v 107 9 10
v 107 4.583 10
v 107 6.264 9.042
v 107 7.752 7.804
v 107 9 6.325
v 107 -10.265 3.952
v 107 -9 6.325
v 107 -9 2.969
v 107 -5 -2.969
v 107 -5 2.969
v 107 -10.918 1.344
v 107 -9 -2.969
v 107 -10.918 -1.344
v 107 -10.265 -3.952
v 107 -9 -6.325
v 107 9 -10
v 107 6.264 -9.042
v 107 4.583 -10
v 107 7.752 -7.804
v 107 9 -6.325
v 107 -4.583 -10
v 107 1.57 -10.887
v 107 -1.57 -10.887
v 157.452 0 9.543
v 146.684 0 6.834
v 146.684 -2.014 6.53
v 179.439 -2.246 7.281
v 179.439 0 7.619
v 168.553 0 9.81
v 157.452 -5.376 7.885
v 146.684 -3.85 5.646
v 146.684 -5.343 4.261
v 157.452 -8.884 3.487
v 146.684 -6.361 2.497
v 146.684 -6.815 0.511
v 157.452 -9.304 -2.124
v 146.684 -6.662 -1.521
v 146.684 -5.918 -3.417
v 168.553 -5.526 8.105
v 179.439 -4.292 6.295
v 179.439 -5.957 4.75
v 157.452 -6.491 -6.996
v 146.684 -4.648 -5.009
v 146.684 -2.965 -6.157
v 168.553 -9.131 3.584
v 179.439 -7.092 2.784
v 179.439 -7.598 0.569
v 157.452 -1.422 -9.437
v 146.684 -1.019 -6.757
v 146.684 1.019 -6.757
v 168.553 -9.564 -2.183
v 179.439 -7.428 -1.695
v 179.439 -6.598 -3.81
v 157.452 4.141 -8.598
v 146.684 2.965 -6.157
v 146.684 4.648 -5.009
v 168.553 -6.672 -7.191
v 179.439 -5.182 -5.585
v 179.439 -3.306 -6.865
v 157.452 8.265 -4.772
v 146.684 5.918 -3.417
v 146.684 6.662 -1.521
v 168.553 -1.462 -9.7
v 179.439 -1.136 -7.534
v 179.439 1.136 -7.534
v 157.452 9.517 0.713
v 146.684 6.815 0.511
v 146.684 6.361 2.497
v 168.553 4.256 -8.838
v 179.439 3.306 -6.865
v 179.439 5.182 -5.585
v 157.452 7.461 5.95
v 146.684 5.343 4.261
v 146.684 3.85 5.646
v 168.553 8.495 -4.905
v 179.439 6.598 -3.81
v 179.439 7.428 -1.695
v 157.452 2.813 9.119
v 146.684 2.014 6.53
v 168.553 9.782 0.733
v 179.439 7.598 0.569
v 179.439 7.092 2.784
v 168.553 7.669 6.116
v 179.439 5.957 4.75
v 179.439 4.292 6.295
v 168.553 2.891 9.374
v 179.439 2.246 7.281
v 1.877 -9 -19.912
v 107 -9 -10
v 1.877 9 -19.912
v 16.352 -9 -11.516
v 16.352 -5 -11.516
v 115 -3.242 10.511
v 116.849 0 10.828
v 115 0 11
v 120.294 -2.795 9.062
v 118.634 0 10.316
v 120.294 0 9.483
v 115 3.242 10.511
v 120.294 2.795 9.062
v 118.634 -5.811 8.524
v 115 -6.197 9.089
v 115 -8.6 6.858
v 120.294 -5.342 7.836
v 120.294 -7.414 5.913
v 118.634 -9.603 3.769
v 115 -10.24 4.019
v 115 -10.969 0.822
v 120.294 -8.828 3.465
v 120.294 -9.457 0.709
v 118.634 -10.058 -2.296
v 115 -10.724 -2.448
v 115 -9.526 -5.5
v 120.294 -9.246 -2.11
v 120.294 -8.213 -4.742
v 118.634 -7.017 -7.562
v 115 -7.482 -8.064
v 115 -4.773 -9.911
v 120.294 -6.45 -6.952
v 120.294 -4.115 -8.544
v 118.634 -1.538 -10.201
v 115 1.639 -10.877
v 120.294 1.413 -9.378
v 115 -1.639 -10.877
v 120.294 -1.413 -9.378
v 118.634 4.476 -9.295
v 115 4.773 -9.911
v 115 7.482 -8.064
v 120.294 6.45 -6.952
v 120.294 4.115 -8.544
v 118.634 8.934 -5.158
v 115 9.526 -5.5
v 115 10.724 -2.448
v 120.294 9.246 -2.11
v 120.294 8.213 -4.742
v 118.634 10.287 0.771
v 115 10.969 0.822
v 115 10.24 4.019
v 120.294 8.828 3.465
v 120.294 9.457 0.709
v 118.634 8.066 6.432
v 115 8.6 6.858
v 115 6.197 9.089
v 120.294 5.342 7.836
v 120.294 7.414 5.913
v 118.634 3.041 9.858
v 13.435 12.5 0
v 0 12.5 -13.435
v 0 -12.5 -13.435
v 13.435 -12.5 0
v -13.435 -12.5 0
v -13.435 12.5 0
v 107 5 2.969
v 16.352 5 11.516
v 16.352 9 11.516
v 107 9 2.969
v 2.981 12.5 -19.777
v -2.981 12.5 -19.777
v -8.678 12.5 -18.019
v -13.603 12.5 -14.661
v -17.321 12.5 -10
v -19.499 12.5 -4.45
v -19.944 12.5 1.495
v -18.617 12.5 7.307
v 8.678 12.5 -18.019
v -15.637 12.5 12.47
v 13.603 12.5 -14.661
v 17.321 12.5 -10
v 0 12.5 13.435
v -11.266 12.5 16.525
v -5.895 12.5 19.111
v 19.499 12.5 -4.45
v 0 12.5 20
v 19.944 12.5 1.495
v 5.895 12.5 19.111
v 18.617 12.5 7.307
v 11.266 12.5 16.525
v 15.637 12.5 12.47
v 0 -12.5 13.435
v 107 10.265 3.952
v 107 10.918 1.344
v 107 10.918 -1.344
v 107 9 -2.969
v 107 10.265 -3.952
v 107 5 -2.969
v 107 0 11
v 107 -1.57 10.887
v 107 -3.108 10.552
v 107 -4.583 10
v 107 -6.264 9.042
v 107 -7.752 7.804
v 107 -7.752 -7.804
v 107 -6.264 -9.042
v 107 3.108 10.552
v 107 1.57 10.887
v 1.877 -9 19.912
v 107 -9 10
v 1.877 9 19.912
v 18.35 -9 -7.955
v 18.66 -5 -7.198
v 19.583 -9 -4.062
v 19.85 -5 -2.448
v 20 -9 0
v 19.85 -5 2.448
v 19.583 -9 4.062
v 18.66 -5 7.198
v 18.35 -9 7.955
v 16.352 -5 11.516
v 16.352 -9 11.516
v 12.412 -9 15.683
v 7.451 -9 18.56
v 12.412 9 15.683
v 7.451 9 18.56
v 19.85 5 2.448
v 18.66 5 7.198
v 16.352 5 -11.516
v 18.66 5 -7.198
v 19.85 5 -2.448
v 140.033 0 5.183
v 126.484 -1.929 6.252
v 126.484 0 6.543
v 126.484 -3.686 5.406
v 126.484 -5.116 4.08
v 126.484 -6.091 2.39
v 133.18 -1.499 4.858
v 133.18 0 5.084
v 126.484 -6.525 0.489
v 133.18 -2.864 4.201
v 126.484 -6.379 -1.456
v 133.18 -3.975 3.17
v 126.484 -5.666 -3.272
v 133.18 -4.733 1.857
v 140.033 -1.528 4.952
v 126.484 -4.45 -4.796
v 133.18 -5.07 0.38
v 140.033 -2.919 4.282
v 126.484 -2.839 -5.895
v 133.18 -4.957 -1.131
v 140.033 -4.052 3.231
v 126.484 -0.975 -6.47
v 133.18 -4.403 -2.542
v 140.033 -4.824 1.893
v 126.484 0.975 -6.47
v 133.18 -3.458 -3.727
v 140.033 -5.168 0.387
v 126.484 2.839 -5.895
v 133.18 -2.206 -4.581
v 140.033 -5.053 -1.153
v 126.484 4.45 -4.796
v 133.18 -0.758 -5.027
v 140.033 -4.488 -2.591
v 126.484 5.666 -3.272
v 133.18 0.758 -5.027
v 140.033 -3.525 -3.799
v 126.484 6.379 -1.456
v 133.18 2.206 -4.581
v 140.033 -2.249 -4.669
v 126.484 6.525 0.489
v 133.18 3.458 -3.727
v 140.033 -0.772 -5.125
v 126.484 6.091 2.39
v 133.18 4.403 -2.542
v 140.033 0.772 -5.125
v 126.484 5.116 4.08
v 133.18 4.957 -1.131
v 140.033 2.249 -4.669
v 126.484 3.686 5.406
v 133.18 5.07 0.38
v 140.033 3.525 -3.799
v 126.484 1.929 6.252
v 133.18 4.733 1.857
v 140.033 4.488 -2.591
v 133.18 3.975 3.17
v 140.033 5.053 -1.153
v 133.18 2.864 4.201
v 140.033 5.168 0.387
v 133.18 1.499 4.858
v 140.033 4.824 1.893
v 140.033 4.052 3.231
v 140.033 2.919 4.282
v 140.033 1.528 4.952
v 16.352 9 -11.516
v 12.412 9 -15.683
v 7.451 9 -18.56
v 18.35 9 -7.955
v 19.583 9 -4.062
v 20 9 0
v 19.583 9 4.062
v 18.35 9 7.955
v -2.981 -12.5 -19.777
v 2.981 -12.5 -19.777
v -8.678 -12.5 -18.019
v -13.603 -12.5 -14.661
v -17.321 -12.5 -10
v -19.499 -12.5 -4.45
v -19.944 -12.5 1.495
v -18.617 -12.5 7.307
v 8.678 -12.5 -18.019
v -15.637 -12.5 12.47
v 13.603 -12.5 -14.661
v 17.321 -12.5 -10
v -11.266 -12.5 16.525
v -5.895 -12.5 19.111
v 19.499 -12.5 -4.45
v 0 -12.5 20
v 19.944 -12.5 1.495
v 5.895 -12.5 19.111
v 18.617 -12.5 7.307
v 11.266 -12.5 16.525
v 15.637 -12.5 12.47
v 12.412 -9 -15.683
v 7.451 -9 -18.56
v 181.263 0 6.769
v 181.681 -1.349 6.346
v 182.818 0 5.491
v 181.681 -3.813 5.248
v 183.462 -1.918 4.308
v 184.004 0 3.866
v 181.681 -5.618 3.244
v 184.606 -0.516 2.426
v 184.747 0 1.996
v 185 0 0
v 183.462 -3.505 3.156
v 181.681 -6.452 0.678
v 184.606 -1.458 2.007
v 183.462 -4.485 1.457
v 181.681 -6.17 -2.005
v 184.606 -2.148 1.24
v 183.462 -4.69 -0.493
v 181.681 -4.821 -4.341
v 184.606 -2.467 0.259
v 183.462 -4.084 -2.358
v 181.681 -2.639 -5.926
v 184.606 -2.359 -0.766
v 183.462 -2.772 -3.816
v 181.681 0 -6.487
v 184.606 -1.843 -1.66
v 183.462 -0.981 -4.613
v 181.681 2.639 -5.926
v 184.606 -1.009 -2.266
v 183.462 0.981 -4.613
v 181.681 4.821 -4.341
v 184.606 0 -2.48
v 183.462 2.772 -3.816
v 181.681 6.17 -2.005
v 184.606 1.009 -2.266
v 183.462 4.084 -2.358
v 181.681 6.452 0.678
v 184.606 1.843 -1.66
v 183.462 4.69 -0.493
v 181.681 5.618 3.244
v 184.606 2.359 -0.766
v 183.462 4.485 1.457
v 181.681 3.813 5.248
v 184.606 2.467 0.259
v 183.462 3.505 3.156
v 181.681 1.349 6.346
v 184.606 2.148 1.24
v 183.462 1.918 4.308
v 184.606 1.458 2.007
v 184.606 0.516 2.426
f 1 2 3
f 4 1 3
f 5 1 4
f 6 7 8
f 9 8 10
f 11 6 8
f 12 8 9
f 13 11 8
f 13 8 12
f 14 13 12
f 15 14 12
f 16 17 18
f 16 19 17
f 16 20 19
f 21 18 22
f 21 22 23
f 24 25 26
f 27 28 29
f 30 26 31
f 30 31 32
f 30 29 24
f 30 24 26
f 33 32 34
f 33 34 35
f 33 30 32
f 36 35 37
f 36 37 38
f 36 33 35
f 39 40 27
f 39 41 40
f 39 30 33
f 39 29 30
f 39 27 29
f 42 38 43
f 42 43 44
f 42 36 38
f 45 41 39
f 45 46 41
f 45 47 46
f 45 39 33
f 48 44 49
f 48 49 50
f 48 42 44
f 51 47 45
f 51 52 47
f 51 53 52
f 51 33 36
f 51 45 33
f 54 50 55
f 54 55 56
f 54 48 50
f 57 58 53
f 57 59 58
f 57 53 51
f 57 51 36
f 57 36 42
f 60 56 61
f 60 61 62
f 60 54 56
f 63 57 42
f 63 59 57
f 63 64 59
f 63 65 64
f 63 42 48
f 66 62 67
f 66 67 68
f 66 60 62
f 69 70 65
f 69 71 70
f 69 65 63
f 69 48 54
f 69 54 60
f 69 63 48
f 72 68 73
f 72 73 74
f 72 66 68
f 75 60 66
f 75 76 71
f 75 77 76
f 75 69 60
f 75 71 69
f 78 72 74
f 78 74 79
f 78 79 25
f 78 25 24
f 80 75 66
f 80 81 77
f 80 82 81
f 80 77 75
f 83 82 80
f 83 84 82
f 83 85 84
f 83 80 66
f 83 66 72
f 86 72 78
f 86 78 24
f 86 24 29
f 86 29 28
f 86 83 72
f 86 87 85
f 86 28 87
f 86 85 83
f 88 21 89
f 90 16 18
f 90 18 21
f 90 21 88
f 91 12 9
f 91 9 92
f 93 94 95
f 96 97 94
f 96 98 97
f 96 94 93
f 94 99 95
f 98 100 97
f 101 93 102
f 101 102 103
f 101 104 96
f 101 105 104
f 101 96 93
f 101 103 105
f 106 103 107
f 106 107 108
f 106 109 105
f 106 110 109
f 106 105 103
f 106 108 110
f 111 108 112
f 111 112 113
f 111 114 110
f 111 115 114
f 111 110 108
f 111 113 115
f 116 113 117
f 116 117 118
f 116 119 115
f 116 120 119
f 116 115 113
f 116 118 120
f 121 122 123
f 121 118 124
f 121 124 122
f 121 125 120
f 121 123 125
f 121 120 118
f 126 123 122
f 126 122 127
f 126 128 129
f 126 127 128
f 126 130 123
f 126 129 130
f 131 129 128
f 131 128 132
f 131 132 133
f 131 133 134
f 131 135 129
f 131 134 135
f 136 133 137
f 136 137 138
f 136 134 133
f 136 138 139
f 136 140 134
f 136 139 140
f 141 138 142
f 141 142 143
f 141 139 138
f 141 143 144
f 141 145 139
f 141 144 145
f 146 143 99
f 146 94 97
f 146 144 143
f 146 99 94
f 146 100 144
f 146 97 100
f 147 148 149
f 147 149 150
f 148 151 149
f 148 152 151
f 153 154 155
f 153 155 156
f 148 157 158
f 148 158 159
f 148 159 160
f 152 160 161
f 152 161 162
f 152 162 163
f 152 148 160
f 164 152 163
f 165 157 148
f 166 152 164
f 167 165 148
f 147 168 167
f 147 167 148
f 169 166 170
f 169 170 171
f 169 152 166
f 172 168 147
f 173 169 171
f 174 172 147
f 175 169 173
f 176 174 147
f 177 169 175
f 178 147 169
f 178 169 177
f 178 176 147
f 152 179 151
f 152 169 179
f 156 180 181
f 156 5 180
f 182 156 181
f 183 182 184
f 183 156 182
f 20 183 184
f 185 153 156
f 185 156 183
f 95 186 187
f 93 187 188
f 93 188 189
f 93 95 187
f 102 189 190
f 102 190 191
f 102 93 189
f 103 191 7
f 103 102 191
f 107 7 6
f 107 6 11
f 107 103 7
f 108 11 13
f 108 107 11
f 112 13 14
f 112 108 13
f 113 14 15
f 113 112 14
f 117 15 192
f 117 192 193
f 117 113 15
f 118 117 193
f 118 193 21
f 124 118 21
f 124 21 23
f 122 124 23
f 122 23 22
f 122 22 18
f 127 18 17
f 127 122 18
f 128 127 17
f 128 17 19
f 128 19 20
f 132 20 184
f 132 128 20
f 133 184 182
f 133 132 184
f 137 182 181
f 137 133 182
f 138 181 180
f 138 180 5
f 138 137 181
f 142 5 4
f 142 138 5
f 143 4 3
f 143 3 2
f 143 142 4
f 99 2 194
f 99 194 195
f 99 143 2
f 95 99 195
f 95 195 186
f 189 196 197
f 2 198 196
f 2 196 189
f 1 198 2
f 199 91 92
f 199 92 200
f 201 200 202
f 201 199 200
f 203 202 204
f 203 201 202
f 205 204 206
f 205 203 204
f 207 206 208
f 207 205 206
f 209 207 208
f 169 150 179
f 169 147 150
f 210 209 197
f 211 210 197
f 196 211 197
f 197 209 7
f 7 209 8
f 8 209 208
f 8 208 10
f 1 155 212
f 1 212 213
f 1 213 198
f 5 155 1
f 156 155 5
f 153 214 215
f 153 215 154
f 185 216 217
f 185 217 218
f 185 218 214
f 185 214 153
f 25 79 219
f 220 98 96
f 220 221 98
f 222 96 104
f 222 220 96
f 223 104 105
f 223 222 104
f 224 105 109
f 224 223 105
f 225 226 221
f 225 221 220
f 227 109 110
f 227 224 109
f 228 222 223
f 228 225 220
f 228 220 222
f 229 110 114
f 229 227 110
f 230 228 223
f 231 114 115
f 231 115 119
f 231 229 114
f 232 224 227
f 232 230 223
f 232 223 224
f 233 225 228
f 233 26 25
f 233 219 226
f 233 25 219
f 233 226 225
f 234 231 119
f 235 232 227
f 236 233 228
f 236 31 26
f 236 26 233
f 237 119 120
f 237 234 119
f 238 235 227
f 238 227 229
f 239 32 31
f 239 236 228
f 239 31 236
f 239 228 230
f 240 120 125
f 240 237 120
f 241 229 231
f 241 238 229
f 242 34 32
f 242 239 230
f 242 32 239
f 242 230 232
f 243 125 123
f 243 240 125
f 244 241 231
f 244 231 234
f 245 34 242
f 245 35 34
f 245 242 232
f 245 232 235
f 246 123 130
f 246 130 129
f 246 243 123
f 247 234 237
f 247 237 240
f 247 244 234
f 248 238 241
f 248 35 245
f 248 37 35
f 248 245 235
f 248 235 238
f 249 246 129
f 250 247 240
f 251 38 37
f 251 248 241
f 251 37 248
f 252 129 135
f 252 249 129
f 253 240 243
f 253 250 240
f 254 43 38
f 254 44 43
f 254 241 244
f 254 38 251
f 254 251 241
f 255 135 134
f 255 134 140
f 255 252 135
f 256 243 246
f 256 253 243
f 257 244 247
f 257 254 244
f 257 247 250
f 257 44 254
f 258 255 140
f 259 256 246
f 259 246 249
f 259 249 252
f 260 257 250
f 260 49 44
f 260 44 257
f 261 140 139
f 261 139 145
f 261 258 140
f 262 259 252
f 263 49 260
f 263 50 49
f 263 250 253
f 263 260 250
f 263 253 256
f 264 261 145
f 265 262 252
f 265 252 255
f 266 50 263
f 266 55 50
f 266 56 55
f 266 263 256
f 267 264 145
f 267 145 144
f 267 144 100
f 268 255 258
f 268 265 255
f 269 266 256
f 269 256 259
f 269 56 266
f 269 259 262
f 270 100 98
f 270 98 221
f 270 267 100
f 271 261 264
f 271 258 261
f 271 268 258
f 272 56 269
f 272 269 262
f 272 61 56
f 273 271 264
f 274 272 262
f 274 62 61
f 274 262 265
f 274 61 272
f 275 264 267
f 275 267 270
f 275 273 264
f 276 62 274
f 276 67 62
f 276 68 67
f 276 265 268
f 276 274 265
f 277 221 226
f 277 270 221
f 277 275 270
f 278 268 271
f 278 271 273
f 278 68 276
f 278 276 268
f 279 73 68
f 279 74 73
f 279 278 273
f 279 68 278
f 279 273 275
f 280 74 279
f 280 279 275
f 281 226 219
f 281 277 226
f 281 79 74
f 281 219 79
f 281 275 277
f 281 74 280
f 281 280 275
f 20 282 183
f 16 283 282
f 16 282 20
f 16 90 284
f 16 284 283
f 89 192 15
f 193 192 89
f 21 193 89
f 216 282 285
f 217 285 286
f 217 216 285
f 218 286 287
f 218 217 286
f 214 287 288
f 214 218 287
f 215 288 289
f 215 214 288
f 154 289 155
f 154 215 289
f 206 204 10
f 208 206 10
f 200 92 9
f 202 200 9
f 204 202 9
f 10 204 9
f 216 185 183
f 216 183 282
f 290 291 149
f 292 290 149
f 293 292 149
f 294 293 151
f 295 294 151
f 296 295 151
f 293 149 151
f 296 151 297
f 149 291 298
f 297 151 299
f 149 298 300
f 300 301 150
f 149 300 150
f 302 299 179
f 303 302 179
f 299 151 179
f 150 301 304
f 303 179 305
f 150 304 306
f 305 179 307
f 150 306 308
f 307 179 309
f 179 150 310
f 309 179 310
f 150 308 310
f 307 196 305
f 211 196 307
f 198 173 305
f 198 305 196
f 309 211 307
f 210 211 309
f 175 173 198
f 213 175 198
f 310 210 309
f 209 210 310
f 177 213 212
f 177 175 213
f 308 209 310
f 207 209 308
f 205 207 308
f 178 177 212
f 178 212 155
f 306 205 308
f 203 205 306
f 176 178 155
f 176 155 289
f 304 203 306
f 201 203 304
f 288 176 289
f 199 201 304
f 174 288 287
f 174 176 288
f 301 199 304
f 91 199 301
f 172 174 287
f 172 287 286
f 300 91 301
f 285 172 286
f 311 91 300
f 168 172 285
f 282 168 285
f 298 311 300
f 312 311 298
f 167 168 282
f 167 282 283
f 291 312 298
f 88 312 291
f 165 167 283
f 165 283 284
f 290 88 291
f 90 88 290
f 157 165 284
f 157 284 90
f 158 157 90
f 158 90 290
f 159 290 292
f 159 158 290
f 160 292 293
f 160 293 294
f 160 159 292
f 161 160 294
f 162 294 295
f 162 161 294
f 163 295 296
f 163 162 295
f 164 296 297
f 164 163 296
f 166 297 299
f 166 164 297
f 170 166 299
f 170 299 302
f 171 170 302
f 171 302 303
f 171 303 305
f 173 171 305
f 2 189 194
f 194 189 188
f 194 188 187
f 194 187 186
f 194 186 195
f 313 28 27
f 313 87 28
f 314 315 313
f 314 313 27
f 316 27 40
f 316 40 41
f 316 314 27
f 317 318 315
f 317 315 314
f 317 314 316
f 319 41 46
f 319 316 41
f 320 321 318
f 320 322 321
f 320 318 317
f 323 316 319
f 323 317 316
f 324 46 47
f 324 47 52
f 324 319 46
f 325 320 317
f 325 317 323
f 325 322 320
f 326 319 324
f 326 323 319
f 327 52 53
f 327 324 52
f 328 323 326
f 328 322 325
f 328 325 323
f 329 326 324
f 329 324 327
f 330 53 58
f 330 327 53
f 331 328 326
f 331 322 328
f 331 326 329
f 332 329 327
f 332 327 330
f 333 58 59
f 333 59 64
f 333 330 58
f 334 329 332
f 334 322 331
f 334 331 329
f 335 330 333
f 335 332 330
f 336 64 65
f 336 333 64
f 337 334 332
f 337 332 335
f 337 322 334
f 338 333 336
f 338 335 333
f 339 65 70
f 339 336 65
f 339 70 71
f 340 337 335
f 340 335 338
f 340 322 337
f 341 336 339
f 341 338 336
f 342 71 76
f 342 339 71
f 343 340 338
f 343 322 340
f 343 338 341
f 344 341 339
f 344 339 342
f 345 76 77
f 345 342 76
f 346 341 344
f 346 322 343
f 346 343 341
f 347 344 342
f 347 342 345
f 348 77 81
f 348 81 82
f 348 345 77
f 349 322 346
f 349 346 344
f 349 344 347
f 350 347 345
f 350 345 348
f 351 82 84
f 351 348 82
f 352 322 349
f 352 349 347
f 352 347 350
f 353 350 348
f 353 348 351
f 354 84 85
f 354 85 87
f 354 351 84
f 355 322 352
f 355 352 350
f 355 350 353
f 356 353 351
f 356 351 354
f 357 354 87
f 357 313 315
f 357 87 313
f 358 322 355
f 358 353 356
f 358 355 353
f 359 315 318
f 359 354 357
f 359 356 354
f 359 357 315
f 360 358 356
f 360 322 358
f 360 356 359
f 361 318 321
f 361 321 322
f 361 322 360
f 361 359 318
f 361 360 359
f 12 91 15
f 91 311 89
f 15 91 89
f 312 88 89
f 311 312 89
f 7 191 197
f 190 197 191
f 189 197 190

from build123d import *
from build123d.topology import SkipClean

# Parameters (mm, degrees)
SKETCH_1_R          = 20
EXTRUDE_1_DEPTH     = 12.5
EXTRUDE_2_DEPTH     = 9
CUT_EXTRUDE_START   = 5
CUT_EXTRUDE_1_DEPTH = 4
CUT_EXTRUDE_START_2 = -9
CUT_EXTRUDE_2_DEPTH = 4


with BuildPart() as part:
    # 草图1 → 凸台-拉伸1 (new, symmetric)
    with BuildSketch(Plane(origin=(0, 0, 0), x_dir=(1, 0, 0), z_dir=(0, 1, 0))):
        with Locations(Location((0, 0, 0), (0, 0, 270))):
            Circle(SKETCH_1_R)
        Polygon((0, 13.435028843), (13.435028843, 0), (0, -13.435028843), (-13.435028843, 0), align=None, mode=Mode.SUBTRACT)
    extrude(amount=EXTRUDE_1_DEPTH, both=True)

    # 草图2 → 凸台-拉伸2 (add, symmetric)
    with BuildSketch(Plane(origin=(0, 0, 0), x_dir=(1, 0, 0), z_dir=(0, 1, 0))):
        with BuildLine():
            ThreePointArc((1.877412327, 19.911688099), (14.791014951, 13.462016072), (20, 0))
            Line((20, 0), (107, 0))
            Line((107, 0), (107, 10))
            Line((107, 10), (1.877412327, 19.911688099))
        make_face()
        with BuildLine():
            Line((107, 0), (20, 0))
            ThreePointArc((20, 0), (14.791014951, -13.462016072), (1.877412327, -19.911688099))
            Line((1.877412327, -19.911688099), (107, -10))
            Line((107, -10), (107, 0))
        make_face()
    extrude(amount=EXTRUDE_2_DEPTH, both=True)

    # 草图3 → 切除-拉伸1 (cut)
    with SkipClean():  # the faces are left unmerged after this step: merging them gives an invalid solid
        with BuildSketch(Plane(origin=(0, 0, 0), x_dir=(1, 0, 0), z_dir=(0, 1, 0)).offset(CUT_EXTRUDE_START)):
            with BuildLine():
                Line((107, 2.968953747), (16.351890932, 11.515887415))
                ThreePointArc((16.351890932, 11.515887415), (20, 0), (16.351890932, -11.515887415))
                Line((16.351890932, -11.515887415), (107, -2.968953747))
                Line((107, -2.968953747), (107, 2.968953747))
            make_face()
        extrude(amount=CUT_EXTRUDE_1_DEPTH, mode=Mode.SUBTRACT)

    # 草图3<2> → 切除-拉伸2 (cut)
    with SkipClean():  # the faces are left unmerged after this step: merging them gives an invalid solid
        with BuildSketch(Plane(origin=(0, 0, 0), x_dir=(1, 0, 0), z_dir=(0, 1, 0)).offset(CUT_EXTRUDE_START_2)):
            with BuildLine():
                Line((107, 2.968953747), (16.351890932, 11.515887415))
                ThreePointArc((16.351890932, 11.515887415), (20, 0), (16.351890932, -11.515887415))
                Line((16.351890932, -11.515887415), (107, -2.968953747))
                Line((107, -2.968953747), (107, 2.968953747))
            make_face()
        extrude(amount=CUT_EXTRUDE_2_DEPTH, mode=Mode.SUBTRACT)

    # 草图4 → 旋转1 (revolve)
    with SkipClean():  # the faces are left unmerged after this step: merging them gives an invalid solid
        with BuildSketch(Plane(origin=(0, 0, 0), x_dir=(1, 0, 0), z_dir=(0, 1, 0)), mode=Mode.PRIVATE) as revolve_1_sk:
            with BuildLine():
                Line((107, 0), (107, 11))
                Line((107, 11), (115, 11))
                ThreePointArc((115, 11), (117.753651476, 10.613397087), (120.294389016, 9.483480709))
                ThreePointArc((120.294389016, 9.483480709), (133.180287907, 5.08402529), (146.683629362, 6.833701774))
                ThreePointArc((146.683629362, 6.833701774), (162.995301682, 9.985635116), (179.439285424, 7.619047619))
                ThreePointArc((179.439285424, 7.619047619), (183.461976609, 4.716233487), (185, 0))
                Line((185, 0), (107, 0))
            make_face()
        revolve(revolve_1_sk.sketch.rotate(Axis((0, 0, 0), (1, 0, 0)), 180), axis=Axis((0, 0, 0), (1, 0, 0)))


solid = part.part
